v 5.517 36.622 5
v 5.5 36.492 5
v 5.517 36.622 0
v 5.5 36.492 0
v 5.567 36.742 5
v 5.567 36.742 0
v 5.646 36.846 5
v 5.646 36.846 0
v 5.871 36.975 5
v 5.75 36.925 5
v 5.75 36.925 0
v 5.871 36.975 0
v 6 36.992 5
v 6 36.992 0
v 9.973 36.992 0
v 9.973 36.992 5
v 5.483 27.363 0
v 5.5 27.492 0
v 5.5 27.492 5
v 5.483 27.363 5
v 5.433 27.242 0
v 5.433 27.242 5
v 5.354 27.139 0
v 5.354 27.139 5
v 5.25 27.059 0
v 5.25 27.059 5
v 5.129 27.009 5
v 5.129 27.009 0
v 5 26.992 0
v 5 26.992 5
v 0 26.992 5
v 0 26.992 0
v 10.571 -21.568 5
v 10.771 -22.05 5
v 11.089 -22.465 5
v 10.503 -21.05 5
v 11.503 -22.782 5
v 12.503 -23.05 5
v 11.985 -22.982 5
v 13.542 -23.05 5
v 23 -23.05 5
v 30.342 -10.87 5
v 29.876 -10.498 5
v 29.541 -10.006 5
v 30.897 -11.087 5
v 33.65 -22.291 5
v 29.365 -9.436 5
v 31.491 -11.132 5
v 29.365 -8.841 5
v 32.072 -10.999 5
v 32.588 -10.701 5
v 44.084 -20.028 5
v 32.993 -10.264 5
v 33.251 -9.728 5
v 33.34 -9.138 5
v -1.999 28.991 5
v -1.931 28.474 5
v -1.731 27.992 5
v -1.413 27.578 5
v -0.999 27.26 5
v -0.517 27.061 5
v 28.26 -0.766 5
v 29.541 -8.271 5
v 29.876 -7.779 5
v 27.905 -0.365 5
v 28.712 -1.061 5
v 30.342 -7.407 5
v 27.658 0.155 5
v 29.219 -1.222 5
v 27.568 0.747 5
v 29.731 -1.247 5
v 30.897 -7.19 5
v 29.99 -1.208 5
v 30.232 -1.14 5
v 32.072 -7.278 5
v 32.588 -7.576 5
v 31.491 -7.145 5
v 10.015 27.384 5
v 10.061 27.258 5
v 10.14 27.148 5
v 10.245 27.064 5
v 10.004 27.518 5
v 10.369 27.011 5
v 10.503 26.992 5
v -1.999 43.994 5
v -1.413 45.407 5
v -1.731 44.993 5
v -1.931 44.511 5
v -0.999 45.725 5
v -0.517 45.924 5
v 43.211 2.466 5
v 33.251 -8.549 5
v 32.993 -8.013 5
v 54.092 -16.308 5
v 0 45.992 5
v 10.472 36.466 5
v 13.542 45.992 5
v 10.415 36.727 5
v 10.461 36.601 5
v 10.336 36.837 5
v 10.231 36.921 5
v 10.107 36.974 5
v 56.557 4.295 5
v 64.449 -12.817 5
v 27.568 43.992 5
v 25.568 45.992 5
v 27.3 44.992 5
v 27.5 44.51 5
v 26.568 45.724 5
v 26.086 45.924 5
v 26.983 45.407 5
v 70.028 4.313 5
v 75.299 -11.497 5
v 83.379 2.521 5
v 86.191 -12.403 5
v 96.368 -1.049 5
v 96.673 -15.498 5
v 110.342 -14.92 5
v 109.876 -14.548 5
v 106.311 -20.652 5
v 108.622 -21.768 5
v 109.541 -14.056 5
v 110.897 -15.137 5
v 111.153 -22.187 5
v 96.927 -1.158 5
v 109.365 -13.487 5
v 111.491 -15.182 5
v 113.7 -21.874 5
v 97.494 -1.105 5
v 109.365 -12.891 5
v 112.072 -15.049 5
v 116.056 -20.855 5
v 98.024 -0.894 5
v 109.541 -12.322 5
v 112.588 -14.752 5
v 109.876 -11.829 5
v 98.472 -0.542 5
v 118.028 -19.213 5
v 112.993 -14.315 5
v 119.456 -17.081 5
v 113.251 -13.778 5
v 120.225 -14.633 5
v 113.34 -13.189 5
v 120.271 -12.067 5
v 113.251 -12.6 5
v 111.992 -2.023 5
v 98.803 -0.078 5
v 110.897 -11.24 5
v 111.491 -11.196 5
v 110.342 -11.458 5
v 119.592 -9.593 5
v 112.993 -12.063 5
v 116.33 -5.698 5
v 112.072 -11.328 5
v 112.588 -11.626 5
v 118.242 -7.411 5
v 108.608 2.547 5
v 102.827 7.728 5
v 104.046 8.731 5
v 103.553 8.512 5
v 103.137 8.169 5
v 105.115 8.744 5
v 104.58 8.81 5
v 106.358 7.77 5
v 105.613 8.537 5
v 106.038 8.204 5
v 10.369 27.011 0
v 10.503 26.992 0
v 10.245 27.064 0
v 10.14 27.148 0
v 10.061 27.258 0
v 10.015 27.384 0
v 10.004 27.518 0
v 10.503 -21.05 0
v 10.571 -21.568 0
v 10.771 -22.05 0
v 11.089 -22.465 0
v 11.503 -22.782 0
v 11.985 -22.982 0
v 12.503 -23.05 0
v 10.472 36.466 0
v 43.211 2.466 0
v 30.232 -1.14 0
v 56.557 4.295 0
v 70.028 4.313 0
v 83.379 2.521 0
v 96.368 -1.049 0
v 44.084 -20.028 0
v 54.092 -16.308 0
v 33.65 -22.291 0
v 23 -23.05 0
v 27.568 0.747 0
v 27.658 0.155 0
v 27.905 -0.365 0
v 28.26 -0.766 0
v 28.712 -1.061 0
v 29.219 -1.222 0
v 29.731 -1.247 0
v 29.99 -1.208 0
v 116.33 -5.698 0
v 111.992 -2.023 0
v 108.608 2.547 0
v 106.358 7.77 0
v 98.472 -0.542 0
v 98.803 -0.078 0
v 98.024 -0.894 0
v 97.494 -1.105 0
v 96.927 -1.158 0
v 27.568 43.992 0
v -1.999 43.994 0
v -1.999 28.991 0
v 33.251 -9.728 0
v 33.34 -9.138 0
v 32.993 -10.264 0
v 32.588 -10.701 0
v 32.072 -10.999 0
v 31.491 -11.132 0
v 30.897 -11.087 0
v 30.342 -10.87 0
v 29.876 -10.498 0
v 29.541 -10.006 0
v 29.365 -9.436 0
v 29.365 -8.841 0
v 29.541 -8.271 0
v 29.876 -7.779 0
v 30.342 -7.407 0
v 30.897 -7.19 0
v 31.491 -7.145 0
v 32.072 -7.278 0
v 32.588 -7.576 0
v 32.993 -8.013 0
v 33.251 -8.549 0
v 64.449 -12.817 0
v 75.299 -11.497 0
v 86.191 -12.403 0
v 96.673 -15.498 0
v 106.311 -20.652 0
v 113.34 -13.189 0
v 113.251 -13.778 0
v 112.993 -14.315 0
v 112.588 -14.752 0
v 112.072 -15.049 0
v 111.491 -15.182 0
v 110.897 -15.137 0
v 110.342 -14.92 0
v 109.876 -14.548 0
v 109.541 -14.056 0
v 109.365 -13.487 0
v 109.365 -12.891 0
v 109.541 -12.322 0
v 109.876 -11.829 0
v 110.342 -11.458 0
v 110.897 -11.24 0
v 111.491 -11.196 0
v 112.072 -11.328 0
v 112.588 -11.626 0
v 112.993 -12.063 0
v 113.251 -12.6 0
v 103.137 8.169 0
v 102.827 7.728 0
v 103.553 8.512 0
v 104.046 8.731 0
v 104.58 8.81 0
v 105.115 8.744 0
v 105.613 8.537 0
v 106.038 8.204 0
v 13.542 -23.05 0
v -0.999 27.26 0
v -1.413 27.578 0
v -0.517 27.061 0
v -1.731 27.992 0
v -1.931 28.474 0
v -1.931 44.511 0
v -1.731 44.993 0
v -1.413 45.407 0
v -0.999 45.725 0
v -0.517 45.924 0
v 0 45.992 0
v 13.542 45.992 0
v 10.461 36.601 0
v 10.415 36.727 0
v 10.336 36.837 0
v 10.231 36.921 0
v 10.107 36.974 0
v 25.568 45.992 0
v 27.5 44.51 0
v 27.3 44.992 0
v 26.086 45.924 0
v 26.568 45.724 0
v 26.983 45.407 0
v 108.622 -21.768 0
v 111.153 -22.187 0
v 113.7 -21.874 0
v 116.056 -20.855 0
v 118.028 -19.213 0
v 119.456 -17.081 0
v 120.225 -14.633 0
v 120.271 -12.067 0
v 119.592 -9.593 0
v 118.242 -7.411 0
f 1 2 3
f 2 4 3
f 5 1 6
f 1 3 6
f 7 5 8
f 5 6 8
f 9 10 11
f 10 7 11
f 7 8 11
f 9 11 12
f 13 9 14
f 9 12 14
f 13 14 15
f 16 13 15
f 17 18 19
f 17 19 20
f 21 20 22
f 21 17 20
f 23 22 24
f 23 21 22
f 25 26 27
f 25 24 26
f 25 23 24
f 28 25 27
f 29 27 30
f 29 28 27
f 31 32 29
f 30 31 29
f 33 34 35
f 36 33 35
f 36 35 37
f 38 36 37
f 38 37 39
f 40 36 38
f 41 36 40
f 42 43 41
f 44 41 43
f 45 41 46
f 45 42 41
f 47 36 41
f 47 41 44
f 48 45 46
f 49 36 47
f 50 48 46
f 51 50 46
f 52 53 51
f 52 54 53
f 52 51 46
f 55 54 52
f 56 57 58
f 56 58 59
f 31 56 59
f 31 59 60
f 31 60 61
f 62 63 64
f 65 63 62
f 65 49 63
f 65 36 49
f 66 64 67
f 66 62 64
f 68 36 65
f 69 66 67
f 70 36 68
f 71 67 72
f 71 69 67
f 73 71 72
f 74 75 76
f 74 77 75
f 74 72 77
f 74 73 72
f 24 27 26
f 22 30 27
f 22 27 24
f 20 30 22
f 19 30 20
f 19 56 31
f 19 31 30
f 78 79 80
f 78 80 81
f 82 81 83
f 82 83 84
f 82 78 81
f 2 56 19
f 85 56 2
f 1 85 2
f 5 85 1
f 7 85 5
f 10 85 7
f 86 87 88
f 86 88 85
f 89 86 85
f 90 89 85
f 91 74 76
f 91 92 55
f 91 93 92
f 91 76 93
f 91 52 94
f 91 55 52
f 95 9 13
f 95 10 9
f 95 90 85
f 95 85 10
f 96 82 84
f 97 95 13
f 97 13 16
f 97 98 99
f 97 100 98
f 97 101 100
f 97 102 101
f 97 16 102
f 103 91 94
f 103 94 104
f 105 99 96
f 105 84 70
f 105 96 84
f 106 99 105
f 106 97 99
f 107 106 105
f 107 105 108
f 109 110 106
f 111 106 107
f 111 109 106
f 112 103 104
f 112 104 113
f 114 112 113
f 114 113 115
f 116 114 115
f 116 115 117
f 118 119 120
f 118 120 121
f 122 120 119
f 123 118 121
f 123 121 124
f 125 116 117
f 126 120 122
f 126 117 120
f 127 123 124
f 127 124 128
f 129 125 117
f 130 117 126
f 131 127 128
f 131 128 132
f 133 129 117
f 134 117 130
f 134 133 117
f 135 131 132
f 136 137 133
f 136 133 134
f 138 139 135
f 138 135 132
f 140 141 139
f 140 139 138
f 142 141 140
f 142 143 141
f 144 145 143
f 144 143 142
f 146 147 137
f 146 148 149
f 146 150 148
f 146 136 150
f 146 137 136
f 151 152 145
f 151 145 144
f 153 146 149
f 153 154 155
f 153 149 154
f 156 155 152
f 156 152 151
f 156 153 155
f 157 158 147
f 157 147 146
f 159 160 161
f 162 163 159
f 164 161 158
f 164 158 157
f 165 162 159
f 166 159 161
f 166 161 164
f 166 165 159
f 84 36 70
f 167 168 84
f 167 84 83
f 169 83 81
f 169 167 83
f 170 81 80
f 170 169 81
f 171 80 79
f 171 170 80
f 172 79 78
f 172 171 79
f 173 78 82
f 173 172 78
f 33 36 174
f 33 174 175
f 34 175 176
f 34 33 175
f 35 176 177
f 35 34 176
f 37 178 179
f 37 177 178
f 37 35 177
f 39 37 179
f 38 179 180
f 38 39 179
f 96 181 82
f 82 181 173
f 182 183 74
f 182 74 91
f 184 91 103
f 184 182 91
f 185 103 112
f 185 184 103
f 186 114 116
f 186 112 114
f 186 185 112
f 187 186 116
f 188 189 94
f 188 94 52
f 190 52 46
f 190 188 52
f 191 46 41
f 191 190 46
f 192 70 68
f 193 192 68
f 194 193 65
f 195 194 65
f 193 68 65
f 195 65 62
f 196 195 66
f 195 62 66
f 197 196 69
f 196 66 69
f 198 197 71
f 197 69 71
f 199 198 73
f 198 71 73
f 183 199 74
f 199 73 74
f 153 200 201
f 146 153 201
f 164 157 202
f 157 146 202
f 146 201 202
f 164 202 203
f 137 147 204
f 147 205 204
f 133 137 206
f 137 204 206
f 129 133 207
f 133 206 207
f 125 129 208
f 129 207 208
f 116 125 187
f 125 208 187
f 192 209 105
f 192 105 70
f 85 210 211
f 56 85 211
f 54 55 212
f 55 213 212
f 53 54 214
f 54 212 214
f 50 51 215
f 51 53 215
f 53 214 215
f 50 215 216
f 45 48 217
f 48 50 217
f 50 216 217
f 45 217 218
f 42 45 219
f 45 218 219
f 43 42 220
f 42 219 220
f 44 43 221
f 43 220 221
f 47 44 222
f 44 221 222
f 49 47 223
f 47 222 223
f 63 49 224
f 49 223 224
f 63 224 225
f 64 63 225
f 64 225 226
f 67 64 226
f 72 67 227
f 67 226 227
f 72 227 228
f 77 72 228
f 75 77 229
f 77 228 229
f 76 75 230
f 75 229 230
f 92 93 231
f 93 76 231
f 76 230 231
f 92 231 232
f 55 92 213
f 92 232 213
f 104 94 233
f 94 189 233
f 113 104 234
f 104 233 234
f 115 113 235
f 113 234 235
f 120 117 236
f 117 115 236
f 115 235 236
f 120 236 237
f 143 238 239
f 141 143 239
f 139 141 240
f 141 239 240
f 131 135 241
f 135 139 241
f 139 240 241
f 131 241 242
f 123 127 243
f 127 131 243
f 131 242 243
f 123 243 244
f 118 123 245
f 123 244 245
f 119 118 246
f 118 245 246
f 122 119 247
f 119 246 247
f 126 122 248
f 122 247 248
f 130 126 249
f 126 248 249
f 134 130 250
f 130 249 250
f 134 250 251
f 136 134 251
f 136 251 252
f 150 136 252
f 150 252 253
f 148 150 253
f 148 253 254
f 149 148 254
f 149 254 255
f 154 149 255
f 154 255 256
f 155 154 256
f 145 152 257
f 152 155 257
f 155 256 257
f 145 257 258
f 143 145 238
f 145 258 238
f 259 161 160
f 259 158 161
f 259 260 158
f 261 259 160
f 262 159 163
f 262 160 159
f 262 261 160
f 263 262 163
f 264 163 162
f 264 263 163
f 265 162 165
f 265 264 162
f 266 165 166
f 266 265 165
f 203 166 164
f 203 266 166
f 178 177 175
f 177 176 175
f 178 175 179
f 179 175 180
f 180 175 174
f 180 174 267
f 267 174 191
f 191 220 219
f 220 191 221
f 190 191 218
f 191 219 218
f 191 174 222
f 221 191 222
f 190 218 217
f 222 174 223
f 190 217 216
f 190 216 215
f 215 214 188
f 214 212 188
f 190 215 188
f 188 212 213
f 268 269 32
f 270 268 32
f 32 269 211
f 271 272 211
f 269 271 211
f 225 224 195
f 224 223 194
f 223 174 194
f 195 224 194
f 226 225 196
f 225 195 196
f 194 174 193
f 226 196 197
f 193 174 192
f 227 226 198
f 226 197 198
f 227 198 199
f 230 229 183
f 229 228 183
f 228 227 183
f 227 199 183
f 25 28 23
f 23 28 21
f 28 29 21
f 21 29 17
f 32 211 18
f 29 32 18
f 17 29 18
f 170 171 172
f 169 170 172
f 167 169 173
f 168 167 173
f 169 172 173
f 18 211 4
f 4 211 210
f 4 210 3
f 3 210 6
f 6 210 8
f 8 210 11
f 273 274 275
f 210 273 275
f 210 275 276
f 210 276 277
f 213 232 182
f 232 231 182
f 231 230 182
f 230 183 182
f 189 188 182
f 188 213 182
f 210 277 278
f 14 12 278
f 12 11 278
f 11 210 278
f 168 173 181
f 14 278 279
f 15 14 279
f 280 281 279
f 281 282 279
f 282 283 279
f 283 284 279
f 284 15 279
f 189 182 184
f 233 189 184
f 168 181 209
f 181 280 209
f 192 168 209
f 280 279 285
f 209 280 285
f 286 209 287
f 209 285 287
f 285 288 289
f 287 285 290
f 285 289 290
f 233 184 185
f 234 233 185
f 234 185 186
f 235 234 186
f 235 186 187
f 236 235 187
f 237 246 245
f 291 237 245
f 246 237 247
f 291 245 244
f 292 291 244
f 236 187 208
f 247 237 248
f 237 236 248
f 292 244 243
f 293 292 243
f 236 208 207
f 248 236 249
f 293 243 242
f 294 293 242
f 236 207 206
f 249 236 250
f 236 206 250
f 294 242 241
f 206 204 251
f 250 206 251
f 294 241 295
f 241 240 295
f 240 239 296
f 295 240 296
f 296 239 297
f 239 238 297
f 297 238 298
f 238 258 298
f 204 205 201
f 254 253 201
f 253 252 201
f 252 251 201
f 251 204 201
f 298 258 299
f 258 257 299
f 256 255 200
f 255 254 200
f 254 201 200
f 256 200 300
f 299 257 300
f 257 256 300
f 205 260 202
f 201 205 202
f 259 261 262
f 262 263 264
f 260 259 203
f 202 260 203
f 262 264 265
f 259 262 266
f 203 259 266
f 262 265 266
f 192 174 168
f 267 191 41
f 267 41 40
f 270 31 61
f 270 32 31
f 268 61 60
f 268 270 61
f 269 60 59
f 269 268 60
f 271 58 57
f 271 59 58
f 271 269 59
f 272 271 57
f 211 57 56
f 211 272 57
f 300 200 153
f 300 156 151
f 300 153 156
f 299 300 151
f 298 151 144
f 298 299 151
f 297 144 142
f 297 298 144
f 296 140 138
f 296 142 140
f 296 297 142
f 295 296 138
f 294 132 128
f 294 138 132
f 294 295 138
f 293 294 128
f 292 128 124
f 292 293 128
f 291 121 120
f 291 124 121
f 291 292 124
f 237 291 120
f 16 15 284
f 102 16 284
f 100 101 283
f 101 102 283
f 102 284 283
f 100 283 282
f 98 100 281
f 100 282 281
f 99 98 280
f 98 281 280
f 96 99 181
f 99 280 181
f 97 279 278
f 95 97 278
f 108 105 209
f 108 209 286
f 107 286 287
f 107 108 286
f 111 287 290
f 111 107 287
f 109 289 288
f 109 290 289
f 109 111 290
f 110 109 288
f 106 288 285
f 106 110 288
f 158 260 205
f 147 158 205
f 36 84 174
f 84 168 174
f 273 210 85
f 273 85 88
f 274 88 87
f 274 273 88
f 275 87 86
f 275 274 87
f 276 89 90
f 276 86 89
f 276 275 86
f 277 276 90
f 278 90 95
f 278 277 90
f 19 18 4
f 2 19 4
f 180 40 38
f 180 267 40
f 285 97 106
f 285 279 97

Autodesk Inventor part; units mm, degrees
ref_plane "YZ Plane" through (0, 0, 0) normal (1, 0, 0) x (0, 1, 0)
ref_plane "XZ Plane" through (0, 0, 0) normal (0, 1, 0) x (-1, 0, 0)
ref_plane "XY Plane" through (0, 0, 0) normal (0, 0, 1) x (1, 0, 0)
sketch "Boceto1" plane through (0, 0, 0) normal (0, 0, 1) x (1, 0, 0)
  line L0 (0, 26.9924) -> (5, 26.9924)
  arc A0 (5, 26.9924) -> (5.5, 27.4924) centre (5, 27.4924) ccw
  line L1 (5.5, 27.4924) -> (5.5, 36.4924)
  arc A1 (6, 36.9924) -> (5.5, 36.4924) centre (6, 36.4924) ccw
  line L2 (6, 36.9924) -> (9.9731, 36.9924)
  arc A2 (10.4724, 36.4662) -> (9.9731, 36.9924) centre (9.9731, 36.4924) ccw
  line L3 (10.4724, 36.4662) -> (10.0035, 27.5185)
  arc A3 (10.0035, 27.5185) -> (10.5028, 26.9924) centre (10.5028, 27.4924) ccw
  arc A4 (23, -23.0504) -> (54.0922, -16.3077) centre (23, 52.0085) ccw
  arc A5 (106.311, -20.6517) -> (54.0922, -16.3077) centre (76.3195, -65.146) ccw
  arc A6 (106.311, -20.6517) -> (116.3303, -5.6981) centre (111.3414, -13.1888) ccw
  arc A7 (106.3579, 7.7696) -> (116.3303, -5.6981) centre (130.0298, 14.8719) ccw
  arc A8 (106.3579, 7.7696) -> (102.827, 7.7277) centre (104.6036, 6.8117) ccw
  line L4 (102.827, 7.7277) -> (98.8026, -0.0781)
  arc A9 (96.3676, -1.0494) -> (98.8026, -0.0781) centre (97.026, 0.8379) ccw
  arc A10 (96.3676, -1.0494) -> (30.1711, -1.1614) centre (63.429, -95.4689) ccw
  line L5 (13.5421, 45.9924) -> (0, 45.9924)
  arc A11 (0, 45.9924) -> (-1.9988, 43.9936) centre (0, 43.9936) ccw
  line L6 (-1.9988, 43.9936) -> (-1.9988, 28.9912)
  arc A12 (-1.9988, 28.9912) -> (0, 26.9924) centre (0, 28.9912) ccw
  circle A13 centre (111.3414, -13.1888) radius 1.9988
  circle A14 centre (31.3414, -9.1385) radius 1.9988
  line L7 (10.5028, 26.9924) -> (10.5028, -23.0504)
  line L8 (23, -23.0504) -> (13.5421, -23.0504)
  line L9 (13.5421, 45.9924) -> (27.5683, 45.9924)
  line L10 (27.5683, 45.9924) -> (27.5683, -2)
  arc A15 (27.5683, -2) -> (30.1711, -1.1614) centre (13.5421, 45.9924) ccw
  line L11 (13.5421, -23.0504) -> (10.5028, -23.0504)
  point P0 (0, 0)
extrude "Extrusión2" add sketch "Boceto1" along normal blind 5
fillet "Empalme1" radius 2 3 edges at (10.5028, -23.0504, 2.5) (27.5683, 45.9924, 2.5) (27.5683, -2, 2.5)
properties part number "soporte bobina nuevo"
